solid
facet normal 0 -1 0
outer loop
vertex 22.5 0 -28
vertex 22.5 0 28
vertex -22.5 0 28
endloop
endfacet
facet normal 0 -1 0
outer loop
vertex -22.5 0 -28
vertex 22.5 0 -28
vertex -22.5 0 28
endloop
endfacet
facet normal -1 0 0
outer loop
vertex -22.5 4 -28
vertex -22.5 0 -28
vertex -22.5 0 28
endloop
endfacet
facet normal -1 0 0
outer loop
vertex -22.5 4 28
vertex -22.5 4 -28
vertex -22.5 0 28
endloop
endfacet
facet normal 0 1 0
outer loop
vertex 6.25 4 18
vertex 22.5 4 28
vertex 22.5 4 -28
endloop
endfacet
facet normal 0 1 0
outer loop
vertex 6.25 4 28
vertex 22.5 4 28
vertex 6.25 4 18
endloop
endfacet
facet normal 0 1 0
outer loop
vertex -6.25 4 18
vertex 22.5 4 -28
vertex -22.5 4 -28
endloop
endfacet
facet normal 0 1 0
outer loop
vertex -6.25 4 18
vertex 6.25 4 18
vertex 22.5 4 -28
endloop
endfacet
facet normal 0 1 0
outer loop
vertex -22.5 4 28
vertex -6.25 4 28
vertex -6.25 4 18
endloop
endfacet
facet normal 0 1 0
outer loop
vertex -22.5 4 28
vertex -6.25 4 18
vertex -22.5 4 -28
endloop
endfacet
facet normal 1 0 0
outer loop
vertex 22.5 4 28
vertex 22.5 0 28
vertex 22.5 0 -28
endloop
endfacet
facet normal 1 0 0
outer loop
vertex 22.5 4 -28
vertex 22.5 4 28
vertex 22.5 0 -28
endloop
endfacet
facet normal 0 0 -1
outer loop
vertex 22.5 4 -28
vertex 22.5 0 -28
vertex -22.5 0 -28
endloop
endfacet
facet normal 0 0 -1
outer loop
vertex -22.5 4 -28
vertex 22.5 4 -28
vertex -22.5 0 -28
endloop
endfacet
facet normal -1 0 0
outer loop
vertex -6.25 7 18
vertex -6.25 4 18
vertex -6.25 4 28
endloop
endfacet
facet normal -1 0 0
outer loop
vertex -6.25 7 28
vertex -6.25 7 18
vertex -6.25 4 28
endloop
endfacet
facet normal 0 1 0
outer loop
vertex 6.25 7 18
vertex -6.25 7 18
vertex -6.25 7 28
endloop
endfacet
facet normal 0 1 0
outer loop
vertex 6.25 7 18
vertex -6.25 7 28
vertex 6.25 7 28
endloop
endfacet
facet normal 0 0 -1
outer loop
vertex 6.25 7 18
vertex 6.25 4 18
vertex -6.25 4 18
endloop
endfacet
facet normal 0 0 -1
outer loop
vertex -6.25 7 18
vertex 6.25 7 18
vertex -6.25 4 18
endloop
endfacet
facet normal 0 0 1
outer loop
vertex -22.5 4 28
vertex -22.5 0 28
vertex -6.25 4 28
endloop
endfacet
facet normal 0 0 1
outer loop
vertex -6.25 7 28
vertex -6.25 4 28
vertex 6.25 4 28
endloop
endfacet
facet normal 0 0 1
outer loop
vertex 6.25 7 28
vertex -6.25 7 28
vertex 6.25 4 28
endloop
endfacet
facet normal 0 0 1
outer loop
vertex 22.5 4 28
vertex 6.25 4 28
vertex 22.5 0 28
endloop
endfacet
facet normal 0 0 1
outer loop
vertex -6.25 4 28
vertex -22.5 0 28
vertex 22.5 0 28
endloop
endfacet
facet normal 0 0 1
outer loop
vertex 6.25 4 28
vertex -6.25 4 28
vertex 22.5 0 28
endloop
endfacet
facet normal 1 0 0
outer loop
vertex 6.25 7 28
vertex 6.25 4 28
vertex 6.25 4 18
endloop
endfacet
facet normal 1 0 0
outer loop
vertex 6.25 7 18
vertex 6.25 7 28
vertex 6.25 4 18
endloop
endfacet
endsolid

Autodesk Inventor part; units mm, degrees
ref_plane "YZ Plane" through (0, 0, 0) normal (1, 0, 0) x (0, 1, 0)
ref_plane "XZ Plane" through (0, 0, 0) normal (0, 1, 0) x (-1, 0, 0)
ref_plane "XY Plane" through (0, 0, 0) normal (0, 0, 1) x (1, 0, 0)
sketch "Sketch1" plane through (0, 0, 0) normal (0, 1, 0) x (-1, 0, 0)
  line L0 (-22.5, -28) -> (22.5, -28)
  line L1 (22.5, -28) -> (22.5, 28)
  line L2 (22.5, 28) -> (-22.5, 28)
  line L3 (-22.5, 28) -> (-22.5, -28)
  line L4 (-22.5, -28) -> (22.5, 28) construction
  line L5 (22.5, -28) -> (-22.5, 28) construction
  point P0 (0, 0)
  dimension "d0" = 56
  dimension "d1" = 45
extrude "Extrusion1" add sketch "Sketch1" along normal blind 4
sketch "Sketch2" plane through (0, 4, 0) normal (0, 1, 0) x (1, 0, 0)
  line L0 (-6.25, -28) -> (6.25, -28)
  line L1 (6.25, -28) -> (6.25, -18)
  line L2 (6.25, -18) -> (-6.25, -18)
  line L3 (-6.25, -18) -> (-6.25, -28)
  line L4 (-22.5, -28) -> (22.5, -28) projected
  point P0 (0, 0)
  point P1 (0, -18)
  dimension "d4" = 12.5
  dimension "d5" = 10
extrude "Extrusion2" add sketch "Sketch2" along normal blind 3
properties part number "BMS"
